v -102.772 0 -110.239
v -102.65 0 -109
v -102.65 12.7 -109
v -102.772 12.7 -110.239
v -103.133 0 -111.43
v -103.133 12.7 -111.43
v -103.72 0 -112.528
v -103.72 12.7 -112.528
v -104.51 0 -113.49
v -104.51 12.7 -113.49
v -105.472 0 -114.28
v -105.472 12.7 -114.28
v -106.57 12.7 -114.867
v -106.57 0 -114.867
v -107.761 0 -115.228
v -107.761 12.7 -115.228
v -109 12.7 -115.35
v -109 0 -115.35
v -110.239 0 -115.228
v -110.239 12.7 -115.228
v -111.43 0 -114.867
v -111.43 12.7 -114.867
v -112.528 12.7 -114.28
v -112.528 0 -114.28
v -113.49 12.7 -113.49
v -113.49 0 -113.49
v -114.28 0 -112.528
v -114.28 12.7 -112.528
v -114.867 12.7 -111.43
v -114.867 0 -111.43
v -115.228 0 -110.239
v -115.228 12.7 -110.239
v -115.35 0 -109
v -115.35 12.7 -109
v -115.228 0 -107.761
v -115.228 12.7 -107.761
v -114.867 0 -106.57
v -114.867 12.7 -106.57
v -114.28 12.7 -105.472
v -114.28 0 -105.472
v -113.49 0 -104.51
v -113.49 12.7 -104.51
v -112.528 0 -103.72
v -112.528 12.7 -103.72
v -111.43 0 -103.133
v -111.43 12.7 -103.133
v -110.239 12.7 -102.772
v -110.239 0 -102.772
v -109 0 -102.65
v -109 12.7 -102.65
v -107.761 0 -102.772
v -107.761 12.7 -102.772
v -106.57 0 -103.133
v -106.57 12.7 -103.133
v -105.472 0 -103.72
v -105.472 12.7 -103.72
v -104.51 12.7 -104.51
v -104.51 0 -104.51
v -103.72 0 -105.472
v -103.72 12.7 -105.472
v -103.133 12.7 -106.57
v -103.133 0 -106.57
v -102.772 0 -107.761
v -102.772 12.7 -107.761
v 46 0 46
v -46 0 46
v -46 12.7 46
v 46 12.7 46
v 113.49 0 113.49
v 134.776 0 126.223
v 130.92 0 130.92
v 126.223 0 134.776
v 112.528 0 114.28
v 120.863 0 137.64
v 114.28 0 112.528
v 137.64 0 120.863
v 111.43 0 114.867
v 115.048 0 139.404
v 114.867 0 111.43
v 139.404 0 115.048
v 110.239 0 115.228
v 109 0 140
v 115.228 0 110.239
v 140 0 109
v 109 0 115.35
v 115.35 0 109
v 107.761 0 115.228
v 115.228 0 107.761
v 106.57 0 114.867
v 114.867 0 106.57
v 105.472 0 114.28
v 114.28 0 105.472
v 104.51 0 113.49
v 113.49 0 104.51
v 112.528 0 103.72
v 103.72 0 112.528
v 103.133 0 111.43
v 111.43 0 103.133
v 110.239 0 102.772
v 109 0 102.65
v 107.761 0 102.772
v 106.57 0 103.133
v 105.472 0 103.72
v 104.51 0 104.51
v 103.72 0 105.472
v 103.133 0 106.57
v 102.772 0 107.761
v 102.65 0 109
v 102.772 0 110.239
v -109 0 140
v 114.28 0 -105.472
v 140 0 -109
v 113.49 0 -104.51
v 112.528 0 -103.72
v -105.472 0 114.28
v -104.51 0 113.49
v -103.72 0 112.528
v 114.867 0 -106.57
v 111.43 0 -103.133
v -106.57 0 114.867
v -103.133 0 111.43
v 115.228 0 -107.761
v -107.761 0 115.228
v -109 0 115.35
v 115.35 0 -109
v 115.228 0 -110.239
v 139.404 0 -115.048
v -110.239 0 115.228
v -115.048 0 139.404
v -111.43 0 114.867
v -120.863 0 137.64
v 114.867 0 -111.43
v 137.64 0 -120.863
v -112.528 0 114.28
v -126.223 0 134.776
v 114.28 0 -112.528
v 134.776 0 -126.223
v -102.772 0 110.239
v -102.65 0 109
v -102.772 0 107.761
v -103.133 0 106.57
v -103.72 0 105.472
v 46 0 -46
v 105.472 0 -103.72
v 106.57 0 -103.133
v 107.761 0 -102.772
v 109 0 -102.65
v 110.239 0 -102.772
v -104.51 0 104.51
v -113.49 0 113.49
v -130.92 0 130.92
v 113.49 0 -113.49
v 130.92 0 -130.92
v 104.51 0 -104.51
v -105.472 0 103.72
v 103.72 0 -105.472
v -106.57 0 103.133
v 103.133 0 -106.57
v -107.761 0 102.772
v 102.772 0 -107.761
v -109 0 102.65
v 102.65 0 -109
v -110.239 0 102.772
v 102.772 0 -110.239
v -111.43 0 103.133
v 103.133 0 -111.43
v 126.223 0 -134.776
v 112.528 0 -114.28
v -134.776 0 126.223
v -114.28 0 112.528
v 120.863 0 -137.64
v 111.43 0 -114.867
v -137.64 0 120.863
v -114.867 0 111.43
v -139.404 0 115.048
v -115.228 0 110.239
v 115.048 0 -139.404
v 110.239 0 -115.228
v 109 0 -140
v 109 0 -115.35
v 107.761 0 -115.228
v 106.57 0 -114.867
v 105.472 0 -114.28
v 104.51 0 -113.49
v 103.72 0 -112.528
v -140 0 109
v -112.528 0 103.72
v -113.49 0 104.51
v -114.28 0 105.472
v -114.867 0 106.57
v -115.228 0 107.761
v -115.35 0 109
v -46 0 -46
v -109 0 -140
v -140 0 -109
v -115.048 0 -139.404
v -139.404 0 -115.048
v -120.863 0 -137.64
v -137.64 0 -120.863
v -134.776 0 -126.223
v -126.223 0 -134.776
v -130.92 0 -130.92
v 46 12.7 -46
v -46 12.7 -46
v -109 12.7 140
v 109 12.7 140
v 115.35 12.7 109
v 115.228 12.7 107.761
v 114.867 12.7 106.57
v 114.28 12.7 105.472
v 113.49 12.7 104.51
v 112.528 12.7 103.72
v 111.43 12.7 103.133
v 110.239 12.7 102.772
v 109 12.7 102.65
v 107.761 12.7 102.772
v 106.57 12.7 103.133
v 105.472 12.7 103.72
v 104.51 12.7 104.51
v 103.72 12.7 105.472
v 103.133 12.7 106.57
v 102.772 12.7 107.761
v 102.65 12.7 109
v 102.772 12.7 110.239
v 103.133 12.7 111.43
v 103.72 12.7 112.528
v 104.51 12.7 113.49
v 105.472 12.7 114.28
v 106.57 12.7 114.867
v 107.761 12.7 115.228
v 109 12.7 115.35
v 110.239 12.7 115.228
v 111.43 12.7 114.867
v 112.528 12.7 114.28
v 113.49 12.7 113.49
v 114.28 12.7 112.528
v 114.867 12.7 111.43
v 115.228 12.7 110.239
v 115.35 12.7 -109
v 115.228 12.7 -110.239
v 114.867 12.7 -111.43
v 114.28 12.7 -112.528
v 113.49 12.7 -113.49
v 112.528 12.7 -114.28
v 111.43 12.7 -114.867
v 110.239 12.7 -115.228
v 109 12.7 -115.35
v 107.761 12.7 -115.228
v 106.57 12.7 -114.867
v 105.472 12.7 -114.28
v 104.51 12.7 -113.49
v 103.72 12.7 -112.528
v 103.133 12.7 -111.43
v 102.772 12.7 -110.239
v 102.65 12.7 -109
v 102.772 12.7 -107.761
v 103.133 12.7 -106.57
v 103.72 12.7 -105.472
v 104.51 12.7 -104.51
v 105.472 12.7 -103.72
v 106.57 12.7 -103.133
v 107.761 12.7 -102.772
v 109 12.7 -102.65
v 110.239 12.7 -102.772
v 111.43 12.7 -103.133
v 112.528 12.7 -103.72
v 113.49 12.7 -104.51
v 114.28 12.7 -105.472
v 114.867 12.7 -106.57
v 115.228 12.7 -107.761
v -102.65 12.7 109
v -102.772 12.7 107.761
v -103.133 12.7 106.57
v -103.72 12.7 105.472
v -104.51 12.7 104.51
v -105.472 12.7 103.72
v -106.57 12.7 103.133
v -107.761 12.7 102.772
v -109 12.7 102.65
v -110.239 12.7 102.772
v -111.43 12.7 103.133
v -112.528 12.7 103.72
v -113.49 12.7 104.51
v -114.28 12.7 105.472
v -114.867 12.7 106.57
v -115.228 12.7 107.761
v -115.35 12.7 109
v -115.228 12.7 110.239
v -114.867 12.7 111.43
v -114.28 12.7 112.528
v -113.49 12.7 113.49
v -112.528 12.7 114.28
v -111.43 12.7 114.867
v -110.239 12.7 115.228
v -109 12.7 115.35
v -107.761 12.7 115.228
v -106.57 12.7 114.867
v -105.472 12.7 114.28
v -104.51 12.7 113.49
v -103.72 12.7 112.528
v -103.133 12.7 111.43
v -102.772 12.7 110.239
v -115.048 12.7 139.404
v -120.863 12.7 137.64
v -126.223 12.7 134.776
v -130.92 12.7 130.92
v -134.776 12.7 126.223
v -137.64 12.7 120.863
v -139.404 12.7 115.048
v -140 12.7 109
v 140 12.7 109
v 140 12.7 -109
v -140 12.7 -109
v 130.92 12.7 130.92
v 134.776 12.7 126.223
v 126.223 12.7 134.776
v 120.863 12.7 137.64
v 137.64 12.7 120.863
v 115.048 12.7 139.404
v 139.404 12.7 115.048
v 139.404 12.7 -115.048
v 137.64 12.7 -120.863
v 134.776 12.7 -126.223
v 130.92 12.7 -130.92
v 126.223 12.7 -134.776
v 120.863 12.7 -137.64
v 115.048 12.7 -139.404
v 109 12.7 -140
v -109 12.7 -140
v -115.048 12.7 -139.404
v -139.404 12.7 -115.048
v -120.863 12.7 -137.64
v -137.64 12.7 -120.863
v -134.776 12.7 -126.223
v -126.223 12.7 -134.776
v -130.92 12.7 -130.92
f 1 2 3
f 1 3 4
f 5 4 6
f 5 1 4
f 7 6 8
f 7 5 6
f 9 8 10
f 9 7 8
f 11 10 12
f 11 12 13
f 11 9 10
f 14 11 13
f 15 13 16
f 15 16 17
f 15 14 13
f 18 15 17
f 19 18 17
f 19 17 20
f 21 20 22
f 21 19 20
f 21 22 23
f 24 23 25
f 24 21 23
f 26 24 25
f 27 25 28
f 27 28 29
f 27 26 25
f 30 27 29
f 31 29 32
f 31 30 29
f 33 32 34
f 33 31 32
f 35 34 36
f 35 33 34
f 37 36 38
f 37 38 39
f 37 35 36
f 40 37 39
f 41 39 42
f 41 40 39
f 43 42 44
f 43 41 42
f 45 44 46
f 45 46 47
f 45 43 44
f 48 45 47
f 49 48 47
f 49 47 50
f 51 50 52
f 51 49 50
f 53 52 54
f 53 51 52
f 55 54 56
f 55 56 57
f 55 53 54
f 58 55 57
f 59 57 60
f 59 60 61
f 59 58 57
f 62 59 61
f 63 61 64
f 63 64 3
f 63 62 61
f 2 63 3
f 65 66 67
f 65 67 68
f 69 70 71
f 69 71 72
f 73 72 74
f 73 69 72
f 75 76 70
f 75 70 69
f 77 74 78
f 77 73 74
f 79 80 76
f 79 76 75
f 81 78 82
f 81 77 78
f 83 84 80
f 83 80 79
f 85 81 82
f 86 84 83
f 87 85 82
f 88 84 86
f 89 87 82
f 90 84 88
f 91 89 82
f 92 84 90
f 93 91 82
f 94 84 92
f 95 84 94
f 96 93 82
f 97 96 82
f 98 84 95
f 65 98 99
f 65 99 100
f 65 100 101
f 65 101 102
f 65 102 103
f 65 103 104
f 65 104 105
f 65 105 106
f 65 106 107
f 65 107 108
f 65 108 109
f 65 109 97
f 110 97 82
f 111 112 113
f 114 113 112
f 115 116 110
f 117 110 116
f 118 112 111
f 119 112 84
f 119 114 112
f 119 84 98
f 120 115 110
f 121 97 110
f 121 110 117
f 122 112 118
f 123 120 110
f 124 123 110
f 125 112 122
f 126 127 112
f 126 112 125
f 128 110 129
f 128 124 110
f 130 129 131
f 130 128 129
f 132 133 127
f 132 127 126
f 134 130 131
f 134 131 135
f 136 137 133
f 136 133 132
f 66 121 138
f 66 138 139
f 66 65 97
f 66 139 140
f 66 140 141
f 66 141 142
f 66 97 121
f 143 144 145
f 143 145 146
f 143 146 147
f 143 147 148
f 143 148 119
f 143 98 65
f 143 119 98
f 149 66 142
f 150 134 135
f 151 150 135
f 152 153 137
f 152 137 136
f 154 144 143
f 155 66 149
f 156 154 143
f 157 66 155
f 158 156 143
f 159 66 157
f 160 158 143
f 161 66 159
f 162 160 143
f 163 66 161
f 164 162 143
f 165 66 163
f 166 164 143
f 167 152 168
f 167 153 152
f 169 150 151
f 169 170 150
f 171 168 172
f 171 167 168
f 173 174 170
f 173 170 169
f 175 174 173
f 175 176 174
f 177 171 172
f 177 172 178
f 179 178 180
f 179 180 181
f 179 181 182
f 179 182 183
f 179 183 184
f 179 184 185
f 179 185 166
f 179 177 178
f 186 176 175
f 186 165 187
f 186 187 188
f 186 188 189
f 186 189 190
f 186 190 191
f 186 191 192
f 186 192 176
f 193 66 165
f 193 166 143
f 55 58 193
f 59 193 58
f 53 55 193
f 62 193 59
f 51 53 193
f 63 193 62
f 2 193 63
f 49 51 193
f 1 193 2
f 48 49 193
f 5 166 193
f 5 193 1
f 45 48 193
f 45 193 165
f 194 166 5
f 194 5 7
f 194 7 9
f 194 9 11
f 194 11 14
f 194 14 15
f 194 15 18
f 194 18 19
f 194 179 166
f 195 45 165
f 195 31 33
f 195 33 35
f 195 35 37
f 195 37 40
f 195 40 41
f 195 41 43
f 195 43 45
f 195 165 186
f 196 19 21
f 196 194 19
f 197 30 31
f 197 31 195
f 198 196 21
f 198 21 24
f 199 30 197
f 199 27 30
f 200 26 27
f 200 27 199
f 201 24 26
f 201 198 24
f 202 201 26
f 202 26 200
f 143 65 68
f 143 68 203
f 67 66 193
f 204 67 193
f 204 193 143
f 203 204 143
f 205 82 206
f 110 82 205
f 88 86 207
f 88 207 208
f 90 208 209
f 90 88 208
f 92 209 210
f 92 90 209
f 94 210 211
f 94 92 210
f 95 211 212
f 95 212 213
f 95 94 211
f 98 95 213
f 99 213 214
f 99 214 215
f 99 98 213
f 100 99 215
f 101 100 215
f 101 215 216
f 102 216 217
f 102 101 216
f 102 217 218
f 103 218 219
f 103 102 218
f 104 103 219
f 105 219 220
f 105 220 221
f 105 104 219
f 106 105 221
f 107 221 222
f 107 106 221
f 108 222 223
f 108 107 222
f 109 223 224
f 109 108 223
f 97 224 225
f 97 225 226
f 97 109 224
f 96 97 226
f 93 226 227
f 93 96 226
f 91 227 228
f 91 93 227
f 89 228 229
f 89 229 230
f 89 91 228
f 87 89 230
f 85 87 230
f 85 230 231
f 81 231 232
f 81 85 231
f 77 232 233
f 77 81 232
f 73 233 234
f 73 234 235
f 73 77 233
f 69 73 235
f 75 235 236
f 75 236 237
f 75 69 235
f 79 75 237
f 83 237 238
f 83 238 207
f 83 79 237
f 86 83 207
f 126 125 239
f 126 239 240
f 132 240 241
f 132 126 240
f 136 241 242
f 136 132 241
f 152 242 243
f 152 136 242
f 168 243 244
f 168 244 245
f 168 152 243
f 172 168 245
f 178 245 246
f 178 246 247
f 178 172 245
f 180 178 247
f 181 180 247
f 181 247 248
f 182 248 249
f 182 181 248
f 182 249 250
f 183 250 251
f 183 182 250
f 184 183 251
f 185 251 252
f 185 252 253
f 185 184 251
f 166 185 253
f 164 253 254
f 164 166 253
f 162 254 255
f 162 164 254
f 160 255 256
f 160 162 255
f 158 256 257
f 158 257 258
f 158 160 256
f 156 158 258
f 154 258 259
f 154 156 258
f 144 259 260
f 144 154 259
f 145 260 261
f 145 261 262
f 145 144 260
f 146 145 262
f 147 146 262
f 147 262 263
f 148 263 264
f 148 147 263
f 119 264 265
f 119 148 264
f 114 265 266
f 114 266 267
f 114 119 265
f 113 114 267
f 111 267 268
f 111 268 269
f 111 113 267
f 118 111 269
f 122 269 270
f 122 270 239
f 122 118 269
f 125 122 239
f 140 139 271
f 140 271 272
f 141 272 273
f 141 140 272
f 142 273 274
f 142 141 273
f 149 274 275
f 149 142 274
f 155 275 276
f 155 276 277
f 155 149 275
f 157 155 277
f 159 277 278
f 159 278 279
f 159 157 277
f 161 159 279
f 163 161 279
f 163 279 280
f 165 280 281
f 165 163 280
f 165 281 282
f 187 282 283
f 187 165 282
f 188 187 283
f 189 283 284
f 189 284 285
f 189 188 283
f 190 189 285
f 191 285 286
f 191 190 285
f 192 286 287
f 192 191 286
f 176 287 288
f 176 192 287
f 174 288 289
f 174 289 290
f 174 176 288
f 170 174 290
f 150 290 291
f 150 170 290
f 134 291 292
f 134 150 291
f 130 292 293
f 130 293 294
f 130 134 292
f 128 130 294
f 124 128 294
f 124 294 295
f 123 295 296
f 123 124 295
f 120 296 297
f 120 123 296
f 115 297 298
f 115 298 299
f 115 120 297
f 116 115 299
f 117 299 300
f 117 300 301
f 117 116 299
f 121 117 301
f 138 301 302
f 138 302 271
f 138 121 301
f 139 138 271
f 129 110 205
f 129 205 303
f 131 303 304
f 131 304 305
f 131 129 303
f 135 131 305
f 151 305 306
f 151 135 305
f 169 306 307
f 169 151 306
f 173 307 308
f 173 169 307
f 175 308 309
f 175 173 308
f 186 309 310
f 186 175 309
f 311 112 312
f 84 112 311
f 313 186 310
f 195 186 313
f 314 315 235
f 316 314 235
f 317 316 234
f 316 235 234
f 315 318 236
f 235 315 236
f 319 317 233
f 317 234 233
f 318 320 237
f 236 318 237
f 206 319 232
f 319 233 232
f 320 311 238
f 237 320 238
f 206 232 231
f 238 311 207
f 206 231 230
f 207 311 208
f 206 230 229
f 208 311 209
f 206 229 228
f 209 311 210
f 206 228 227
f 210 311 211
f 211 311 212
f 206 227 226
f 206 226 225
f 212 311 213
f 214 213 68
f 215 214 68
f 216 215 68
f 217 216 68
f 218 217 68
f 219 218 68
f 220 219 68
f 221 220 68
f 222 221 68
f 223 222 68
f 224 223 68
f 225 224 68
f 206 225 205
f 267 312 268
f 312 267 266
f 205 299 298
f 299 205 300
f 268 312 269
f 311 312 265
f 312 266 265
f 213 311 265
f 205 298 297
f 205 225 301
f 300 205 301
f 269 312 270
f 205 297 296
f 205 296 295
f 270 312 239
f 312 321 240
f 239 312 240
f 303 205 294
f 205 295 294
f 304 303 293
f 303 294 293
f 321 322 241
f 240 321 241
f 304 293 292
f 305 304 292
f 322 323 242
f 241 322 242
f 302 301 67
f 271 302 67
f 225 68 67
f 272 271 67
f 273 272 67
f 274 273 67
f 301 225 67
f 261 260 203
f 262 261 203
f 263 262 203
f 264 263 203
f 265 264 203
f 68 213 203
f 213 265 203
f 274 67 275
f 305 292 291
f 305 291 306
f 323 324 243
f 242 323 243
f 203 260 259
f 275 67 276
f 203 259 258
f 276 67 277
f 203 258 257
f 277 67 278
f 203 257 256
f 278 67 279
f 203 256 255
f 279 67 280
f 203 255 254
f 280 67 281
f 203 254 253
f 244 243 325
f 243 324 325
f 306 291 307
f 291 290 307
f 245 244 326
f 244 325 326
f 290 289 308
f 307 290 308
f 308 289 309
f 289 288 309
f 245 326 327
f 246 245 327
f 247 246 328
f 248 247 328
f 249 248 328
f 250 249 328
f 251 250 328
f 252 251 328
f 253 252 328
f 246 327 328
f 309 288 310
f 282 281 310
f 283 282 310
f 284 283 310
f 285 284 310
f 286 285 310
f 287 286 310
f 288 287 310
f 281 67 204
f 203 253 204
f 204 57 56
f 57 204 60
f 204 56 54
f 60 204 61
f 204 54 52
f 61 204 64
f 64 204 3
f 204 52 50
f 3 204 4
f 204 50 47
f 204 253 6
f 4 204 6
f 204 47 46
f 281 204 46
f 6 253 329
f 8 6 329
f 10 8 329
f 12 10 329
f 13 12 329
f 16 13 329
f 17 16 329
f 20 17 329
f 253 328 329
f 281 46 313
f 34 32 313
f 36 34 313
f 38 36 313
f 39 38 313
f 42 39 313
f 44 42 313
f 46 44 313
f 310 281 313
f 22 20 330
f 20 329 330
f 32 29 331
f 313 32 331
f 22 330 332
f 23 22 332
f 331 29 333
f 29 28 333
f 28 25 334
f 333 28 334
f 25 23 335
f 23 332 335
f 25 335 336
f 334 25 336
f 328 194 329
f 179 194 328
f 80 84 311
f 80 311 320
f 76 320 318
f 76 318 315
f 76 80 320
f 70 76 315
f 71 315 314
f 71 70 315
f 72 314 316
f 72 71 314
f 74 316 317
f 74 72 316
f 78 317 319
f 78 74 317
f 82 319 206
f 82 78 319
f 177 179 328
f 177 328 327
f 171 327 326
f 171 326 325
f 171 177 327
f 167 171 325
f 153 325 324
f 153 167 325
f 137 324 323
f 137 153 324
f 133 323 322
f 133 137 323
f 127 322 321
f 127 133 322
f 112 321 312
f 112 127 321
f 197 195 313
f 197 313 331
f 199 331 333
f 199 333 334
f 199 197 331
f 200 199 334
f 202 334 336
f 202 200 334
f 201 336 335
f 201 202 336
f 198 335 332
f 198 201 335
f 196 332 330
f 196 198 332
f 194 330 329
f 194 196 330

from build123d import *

# Parameters (mm, degrees)
CROQUIS1_R              = 6.35
CROQUIS1_W              = 92
CROQUIS1_H              = 92
SALIENTE_EXTRUIR1_DEPTH = 12.7


with BuildPart() as part:
    # Croquis1 → Saliente-Extruir1 (new body)
    with BuildSketch(Plane(origin=(0, 0, 0), x_dir=(1, 0, 0), z_dir=(0, 1, 0))):
        with BuildLine():
            Line((-109, 140), (109, 140))
            ThreePointArc((109, 140), (130.920310217, 130.920310217), (140, 109))
            Line((140, 109), (140, -109))
            ThreePointArc((140, -109), (130.920310217, -130.920310217), (109, -140))
            Line((109, -140), (-109, -140))
            ThreePointArc((-109, -140), (-130.920310217, -130.920310217), (-140, -109))
            Line((-140, -109), (-140, 109))
            ThreePointArc((-140, 109), (-130.920310217, 130.920310217), (-109, 140))
        make_face()
        with Locations((-109, -109)):
            Circle(CROQUIS1_R, mode=Mode.SUBTRACT)
        with Locations((-109, 109)):
            Circle(CROQUIS1_R, mode=Mode.SUBTRACT)
        with Locations((109, 109)):
            Circle(CROQUIS1_R, mode=Mode.SUBTRACT)
        with Locations((109, -109)):
            Circle(CROQUIS1_R, mode=Mode.SUBTRACT)
        Rectangle(CROQUIS1_W, CROQUIS1_H, mode=Mode.SUBTRACT)
    extrude(amount=SALIENTE_EXTRUIR1_DEPTH)


solid = part.part
